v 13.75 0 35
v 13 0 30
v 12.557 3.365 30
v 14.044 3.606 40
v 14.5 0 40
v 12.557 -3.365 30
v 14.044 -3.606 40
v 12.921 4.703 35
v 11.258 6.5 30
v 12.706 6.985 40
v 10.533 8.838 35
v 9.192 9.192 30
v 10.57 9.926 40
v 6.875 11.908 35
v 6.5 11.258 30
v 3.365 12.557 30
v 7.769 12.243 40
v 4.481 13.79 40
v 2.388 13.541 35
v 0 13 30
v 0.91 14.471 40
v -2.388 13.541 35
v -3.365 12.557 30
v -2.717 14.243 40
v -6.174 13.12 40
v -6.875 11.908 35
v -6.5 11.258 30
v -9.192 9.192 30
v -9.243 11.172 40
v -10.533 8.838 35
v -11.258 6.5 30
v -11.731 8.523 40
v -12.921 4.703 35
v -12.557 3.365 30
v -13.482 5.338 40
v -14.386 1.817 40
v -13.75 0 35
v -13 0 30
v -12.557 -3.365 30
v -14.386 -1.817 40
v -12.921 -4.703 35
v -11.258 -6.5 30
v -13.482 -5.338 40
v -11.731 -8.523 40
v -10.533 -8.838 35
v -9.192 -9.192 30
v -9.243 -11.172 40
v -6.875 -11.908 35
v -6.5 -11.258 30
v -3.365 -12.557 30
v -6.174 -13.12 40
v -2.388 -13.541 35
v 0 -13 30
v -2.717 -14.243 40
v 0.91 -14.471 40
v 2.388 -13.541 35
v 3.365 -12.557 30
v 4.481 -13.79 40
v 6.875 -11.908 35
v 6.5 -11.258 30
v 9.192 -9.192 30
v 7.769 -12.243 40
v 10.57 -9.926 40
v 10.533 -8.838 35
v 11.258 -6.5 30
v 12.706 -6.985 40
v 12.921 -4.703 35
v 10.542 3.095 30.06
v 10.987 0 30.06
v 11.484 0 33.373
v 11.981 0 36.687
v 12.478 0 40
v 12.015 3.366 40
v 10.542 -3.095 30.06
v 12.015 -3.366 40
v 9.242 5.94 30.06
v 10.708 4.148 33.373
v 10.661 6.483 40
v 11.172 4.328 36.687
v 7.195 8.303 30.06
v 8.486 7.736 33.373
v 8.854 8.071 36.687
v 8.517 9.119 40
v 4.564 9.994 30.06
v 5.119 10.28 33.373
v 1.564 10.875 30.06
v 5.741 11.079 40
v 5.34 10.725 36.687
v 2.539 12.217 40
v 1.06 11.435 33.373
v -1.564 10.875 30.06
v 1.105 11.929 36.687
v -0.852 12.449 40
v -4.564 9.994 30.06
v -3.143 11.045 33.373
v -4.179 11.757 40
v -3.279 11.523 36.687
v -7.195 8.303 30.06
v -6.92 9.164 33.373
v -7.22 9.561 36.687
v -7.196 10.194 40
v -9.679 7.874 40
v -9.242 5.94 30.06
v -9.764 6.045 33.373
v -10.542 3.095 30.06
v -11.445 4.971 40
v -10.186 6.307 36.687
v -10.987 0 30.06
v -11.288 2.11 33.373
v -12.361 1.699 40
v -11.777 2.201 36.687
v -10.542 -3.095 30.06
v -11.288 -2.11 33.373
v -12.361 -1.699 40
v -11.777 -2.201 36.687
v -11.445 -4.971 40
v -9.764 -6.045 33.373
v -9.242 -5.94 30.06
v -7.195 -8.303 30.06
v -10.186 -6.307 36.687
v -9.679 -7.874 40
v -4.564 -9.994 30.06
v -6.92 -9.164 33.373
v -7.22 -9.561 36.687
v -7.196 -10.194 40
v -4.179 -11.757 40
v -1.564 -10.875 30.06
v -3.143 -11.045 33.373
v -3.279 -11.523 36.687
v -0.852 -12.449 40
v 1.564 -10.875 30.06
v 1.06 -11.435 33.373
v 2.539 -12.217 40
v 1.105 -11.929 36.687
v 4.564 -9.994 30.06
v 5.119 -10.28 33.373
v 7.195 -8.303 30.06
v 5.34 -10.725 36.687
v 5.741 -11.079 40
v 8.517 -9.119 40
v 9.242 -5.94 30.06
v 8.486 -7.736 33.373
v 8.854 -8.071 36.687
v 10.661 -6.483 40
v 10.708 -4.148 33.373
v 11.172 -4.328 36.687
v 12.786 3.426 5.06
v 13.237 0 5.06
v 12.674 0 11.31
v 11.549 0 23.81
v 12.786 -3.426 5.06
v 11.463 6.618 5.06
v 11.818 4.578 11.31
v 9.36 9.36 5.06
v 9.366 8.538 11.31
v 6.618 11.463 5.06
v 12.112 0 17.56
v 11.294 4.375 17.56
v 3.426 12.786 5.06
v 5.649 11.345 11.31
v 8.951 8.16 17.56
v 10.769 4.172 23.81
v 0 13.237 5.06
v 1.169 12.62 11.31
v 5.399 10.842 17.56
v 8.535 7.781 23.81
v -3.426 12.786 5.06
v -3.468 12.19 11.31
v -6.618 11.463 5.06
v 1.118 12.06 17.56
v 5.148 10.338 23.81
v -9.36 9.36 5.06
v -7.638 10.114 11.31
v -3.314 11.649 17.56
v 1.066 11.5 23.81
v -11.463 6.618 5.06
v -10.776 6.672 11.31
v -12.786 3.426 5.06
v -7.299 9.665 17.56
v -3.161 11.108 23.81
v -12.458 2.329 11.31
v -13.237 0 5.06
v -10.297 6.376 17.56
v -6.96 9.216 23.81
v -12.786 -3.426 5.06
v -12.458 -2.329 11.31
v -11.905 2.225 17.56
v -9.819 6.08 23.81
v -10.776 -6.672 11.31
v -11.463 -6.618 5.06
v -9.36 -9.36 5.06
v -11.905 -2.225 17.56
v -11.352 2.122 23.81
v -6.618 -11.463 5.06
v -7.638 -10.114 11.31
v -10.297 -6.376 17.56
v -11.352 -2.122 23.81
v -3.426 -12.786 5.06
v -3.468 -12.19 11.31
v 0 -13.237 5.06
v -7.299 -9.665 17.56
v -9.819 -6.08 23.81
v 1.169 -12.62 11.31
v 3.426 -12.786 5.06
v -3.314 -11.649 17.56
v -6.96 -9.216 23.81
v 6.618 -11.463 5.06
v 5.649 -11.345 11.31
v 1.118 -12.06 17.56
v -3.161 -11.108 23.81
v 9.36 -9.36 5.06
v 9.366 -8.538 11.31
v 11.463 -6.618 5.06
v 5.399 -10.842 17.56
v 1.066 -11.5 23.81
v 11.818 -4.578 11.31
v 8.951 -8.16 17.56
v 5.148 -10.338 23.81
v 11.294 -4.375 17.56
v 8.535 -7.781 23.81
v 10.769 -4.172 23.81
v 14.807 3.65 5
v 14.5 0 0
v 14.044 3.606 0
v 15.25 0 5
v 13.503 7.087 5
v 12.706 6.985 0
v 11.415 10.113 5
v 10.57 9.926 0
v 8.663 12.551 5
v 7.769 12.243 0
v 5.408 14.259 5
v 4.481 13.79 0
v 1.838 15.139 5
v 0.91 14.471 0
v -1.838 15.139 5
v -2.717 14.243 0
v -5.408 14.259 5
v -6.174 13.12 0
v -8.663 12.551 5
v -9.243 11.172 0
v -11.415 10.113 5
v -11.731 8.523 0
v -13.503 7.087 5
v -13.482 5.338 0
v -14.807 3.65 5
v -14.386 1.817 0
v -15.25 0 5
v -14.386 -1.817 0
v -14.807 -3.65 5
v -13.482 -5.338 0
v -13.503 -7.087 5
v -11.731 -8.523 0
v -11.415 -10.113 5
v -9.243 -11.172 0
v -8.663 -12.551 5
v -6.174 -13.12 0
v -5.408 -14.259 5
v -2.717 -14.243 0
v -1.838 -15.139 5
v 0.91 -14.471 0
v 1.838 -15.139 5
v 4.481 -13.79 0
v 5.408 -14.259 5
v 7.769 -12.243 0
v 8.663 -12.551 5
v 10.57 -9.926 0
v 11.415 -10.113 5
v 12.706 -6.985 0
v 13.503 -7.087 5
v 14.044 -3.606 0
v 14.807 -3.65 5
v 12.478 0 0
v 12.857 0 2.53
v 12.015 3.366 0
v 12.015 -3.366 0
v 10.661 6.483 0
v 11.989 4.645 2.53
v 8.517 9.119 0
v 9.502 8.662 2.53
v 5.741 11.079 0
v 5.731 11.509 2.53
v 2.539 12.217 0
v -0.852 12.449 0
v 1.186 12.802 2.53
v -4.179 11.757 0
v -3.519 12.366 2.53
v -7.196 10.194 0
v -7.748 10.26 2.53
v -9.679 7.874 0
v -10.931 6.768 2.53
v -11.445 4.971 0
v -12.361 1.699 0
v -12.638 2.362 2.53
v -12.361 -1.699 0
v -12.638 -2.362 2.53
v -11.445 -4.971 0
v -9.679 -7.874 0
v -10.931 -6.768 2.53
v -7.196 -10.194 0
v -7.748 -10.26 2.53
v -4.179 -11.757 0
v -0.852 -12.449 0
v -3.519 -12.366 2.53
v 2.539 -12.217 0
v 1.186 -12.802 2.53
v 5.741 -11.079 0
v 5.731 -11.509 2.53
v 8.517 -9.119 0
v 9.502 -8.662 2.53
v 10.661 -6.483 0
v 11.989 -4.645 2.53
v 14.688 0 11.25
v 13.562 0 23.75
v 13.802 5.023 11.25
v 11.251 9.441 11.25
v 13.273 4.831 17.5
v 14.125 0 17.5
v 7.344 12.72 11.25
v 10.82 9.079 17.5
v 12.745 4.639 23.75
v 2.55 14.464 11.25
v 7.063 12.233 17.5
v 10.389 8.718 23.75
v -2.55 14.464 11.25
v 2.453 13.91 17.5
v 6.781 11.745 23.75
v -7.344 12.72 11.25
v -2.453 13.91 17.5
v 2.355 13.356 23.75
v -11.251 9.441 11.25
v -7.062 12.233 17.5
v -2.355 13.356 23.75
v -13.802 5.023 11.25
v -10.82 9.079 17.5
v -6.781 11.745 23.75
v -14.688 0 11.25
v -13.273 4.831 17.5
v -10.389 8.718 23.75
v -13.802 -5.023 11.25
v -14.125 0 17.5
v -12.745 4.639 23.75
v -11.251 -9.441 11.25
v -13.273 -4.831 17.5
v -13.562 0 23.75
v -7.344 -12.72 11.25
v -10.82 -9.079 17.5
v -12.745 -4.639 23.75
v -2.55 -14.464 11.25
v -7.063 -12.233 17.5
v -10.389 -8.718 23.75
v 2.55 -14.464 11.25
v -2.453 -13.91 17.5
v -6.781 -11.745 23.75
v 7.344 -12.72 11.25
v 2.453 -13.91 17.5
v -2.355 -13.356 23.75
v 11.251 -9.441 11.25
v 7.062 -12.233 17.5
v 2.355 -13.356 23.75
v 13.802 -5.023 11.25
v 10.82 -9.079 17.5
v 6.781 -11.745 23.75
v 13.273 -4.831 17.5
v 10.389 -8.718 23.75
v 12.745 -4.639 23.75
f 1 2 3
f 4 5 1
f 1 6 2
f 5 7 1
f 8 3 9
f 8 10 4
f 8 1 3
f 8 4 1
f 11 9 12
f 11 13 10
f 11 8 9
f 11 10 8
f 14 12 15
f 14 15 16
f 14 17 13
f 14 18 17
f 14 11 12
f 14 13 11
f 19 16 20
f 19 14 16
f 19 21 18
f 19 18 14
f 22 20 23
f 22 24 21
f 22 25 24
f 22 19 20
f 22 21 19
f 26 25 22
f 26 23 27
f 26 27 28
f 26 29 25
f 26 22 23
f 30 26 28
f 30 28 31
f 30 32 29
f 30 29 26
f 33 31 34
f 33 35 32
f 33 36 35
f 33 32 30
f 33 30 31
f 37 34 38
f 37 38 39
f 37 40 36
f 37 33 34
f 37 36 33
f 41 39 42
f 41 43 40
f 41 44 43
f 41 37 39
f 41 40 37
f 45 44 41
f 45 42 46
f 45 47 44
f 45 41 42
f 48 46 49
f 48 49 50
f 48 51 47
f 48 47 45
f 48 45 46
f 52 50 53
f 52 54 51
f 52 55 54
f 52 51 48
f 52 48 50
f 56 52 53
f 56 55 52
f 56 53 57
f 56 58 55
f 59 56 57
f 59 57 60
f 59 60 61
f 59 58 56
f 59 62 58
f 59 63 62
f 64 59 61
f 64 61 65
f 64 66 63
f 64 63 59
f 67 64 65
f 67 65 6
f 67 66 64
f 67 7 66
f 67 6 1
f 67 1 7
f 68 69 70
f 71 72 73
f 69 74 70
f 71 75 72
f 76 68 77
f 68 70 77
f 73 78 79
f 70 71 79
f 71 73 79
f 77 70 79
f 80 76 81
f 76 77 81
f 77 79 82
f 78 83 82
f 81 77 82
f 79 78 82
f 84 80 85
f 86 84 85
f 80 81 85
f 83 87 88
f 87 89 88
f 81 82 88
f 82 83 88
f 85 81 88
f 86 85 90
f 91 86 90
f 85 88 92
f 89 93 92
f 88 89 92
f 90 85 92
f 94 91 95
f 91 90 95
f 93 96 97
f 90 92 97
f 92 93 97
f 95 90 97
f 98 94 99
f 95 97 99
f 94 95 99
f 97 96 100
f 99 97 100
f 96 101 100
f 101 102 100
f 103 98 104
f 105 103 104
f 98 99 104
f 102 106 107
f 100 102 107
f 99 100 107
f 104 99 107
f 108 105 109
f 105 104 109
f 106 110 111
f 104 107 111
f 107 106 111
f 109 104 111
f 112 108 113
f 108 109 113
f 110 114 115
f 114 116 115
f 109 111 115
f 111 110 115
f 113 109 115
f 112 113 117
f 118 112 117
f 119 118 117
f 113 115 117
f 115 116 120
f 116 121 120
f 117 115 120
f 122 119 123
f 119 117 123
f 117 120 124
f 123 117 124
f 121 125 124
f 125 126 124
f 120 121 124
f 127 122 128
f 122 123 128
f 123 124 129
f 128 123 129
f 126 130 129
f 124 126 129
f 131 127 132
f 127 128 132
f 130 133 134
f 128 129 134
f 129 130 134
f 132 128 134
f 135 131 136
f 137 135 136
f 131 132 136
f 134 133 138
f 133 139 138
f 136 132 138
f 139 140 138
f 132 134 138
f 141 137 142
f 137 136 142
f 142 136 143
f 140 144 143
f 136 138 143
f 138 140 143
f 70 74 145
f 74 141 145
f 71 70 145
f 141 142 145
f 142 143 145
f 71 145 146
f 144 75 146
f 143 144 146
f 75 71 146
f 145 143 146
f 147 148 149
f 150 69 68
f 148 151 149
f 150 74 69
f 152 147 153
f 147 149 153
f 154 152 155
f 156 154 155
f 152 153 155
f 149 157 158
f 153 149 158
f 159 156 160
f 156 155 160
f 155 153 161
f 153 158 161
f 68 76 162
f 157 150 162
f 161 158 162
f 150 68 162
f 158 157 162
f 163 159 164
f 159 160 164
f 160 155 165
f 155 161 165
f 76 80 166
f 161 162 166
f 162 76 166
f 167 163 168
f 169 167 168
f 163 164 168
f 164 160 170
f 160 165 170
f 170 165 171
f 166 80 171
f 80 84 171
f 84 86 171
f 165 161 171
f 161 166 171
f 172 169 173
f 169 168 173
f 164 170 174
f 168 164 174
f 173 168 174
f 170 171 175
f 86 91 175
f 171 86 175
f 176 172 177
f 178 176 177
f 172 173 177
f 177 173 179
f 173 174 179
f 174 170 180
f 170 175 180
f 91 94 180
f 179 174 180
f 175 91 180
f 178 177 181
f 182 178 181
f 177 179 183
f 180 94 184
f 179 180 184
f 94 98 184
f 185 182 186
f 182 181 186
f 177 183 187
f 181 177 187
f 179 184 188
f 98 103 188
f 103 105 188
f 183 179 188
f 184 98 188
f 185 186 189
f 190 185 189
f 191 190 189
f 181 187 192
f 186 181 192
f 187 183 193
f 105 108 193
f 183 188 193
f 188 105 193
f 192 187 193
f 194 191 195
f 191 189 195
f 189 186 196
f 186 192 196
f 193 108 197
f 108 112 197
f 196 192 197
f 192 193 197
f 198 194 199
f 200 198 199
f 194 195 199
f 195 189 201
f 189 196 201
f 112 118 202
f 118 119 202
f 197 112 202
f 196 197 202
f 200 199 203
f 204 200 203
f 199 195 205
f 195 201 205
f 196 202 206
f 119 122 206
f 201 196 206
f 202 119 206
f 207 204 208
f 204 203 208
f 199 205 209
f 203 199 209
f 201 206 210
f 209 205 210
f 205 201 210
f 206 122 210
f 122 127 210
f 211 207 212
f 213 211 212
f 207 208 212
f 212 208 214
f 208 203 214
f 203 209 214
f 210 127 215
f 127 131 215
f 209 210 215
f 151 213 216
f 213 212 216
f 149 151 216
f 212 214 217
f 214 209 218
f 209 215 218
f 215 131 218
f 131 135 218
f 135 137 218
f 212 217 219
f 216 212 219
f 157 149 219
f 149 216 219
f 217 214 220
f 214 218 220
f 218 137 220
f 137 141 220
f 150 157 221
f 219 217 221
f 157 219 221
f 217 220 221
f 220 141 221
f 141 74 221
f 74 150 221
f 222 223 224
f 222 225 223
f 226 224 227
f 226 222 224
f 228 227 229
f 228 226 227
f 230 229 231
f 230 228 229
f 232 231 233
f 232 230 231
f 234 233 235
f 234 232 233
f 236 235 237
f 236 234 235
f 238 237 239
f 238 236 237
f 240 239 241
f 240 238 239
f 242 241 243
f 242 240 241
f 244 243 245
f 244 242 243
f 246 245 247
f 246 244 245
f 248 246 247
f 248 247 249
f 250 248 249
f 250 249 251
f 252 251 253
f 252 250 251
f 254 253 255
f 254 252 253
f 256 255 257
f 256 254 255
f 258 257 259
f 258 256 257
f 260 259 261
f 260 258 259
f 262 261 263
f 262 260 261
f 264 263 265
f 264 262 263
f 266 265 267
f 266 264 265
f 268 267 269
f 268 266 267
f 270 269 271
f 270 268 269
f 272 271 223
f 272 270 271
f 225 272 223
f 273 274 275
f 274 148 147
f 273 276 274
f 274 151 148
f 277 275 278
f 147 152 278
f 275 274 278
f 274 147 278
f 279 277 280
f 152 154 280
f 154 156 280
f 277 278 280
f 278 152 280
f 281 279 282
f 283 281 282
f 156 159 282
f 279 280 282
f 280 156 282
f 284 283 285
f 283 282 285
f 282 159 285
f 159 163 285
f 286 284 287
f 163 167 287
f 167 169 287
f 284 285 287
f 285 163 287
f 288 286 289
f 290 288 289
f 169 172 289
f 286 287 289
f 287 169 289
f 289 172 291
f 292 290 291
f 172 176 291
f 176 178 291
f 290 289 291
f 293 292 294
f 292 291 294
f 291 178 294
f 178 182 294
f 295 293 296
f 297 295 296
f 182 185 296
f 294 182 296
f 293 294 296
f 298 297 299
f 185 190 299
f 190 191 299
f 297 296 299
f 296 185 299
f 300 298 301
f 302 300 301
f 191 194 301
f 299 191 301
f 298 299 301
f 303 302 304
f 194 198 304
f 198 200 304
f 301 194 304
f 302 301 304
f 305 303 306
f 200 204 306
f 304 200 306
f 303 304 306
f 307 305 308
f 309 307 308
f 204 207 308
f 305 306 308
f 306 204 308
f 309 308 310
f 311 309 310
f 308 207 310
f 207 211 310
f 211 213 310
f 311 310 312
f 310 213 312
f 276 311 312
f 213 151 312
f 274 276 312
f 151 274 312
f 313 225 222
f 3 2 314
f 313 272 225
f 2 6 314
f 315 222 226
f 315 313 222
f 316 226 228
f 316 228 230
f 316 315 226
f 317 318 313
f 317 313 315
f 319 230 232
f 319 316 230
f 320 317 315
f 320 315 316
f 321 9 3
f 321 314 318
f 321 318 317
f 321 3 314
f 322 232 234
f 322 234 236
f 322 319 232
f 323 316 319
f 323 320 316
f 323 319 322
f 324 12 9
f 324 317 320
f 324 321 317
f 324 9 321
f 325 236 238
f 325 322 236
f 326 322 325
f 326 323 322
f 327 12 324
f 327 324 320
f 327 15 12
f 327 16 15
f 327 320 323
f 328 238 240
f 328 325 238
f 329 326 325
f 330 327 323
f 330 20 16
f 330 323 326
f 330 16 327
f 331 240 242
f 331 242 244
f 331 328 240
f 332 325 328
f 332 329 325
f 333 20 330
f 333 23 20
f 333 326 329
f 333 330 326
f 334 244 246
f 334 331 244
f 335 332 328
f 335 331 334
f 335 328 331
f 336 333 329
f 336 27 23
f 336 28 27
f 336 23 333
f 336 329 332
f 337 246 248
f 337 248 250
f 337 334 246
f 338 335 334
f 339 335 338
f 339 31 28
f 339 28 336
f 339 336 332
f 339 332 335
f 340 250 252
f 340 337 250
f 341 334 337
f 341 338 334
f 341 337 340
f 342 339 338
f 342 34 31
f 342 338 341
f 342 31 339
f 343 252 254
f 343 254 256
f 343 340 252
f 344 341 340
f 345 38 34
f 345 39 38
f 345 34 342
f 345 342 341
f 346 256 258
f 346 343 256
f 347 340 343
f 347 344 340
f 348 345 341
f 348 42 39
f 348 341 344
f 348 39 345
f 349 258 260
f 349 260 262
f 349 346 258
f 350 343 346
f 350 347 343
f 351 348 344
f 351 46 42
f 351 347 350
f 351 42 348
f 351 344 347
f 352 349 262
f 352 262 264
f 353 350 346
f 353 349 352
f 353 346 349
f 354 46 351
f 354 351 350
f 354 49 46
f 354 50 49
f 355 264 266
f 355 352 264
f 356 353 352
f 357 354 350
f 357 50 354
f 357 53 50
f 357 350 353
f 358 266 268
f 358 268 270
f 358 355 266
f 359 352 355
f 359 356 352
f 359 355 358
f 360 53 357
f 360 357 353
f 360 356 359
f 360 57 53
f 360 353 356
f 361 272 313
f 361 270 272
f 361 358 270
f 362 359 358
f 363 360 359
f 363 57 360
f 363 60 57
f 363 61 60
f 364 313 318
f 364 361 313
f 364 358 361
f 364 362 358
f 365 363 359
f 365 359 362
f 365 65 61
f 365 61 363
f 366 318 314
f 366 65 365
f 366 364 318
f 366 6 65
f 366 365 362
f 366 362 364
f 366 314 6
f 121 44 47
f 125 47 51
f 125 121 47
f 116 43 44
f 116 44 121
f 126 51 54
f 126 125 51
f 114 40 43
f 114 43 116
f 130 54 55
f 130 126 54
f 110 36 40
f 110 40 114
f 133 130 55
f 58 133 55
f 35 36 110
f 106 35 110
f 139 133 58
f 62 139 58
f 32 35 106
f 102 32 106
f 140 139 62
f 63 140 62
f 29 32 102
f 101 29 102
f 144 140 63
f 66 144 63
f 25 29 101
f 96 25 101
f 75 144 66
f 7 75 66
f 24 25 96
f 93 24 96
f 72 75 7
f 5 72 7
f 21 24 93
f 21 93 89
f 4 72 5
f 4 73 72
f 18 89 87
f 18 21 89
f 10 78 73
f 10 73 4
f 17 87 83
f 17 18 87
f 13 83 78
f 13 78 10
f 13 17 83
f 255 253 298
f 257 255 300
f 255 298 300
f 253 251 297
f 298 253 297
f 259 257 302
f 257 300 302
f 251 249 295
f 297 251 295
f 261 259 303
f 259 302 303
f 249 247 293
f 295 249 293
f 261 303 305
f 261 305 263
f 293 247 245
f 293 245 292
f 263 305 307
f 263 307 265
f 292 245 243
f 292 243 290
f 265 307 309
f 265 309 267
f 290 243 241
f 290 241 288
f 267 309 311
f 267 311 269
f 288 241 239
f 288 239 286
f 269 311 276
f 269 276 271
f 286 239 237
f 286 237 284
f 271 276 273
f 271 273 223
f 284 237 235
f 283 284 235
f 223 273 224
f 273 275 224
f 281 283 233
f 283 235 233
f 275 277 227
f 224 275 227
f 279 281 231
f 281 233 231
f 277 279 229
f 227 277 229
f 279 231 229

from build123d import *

# Parameters (mm, degrees)
F0_R      = 14.5
F2_R      = 15.25
F3_FACE_R = 15.25
F5_R      = 13
F6_FACE_R = 13
F8_R      = 14.5
F10_T     = -2


with BuildPart() as f3:
    # F0 (on Top) → F3 section 0
    with BuildSketch(Plane.XY):
        Circle(F0_R)
    # F2 (on offset) → F3 section 1
    with BuildSketch(Plane.XY.offset(5)):
        Circle(F2_R)
    loft()

    # F3_face (on face) → F6 section 0
    with BuildSketch(Plane.XY.offset(5)):
        Circle(F3_FACE_R)
    # F5 (on offset) → F6 section 1
    with BuildSketch(Plane.XY.offset(30)):
        Circle(F5_R)
    loft()

    # F6_face (on face) → F9 section 0
    with BuildSketch(Plane.XY.offset(30)):
        Circle(F6_FACE_R)
    # F8 (on offset) → F9 section 1
    with BuildSketch(Plane.XY.offset(40)):
        Circle(F8_R)
    loft()

    # F10
    f10_openings = [f3.faces().sort_by_distance(p)[0] for p in [
        (0, 0, 40),
        (0, 0, 0),
    ]]
    offset(amount=F10_T, openings=f10_openings, kind=Kind.INTERSECTION)


solid = f3.part
